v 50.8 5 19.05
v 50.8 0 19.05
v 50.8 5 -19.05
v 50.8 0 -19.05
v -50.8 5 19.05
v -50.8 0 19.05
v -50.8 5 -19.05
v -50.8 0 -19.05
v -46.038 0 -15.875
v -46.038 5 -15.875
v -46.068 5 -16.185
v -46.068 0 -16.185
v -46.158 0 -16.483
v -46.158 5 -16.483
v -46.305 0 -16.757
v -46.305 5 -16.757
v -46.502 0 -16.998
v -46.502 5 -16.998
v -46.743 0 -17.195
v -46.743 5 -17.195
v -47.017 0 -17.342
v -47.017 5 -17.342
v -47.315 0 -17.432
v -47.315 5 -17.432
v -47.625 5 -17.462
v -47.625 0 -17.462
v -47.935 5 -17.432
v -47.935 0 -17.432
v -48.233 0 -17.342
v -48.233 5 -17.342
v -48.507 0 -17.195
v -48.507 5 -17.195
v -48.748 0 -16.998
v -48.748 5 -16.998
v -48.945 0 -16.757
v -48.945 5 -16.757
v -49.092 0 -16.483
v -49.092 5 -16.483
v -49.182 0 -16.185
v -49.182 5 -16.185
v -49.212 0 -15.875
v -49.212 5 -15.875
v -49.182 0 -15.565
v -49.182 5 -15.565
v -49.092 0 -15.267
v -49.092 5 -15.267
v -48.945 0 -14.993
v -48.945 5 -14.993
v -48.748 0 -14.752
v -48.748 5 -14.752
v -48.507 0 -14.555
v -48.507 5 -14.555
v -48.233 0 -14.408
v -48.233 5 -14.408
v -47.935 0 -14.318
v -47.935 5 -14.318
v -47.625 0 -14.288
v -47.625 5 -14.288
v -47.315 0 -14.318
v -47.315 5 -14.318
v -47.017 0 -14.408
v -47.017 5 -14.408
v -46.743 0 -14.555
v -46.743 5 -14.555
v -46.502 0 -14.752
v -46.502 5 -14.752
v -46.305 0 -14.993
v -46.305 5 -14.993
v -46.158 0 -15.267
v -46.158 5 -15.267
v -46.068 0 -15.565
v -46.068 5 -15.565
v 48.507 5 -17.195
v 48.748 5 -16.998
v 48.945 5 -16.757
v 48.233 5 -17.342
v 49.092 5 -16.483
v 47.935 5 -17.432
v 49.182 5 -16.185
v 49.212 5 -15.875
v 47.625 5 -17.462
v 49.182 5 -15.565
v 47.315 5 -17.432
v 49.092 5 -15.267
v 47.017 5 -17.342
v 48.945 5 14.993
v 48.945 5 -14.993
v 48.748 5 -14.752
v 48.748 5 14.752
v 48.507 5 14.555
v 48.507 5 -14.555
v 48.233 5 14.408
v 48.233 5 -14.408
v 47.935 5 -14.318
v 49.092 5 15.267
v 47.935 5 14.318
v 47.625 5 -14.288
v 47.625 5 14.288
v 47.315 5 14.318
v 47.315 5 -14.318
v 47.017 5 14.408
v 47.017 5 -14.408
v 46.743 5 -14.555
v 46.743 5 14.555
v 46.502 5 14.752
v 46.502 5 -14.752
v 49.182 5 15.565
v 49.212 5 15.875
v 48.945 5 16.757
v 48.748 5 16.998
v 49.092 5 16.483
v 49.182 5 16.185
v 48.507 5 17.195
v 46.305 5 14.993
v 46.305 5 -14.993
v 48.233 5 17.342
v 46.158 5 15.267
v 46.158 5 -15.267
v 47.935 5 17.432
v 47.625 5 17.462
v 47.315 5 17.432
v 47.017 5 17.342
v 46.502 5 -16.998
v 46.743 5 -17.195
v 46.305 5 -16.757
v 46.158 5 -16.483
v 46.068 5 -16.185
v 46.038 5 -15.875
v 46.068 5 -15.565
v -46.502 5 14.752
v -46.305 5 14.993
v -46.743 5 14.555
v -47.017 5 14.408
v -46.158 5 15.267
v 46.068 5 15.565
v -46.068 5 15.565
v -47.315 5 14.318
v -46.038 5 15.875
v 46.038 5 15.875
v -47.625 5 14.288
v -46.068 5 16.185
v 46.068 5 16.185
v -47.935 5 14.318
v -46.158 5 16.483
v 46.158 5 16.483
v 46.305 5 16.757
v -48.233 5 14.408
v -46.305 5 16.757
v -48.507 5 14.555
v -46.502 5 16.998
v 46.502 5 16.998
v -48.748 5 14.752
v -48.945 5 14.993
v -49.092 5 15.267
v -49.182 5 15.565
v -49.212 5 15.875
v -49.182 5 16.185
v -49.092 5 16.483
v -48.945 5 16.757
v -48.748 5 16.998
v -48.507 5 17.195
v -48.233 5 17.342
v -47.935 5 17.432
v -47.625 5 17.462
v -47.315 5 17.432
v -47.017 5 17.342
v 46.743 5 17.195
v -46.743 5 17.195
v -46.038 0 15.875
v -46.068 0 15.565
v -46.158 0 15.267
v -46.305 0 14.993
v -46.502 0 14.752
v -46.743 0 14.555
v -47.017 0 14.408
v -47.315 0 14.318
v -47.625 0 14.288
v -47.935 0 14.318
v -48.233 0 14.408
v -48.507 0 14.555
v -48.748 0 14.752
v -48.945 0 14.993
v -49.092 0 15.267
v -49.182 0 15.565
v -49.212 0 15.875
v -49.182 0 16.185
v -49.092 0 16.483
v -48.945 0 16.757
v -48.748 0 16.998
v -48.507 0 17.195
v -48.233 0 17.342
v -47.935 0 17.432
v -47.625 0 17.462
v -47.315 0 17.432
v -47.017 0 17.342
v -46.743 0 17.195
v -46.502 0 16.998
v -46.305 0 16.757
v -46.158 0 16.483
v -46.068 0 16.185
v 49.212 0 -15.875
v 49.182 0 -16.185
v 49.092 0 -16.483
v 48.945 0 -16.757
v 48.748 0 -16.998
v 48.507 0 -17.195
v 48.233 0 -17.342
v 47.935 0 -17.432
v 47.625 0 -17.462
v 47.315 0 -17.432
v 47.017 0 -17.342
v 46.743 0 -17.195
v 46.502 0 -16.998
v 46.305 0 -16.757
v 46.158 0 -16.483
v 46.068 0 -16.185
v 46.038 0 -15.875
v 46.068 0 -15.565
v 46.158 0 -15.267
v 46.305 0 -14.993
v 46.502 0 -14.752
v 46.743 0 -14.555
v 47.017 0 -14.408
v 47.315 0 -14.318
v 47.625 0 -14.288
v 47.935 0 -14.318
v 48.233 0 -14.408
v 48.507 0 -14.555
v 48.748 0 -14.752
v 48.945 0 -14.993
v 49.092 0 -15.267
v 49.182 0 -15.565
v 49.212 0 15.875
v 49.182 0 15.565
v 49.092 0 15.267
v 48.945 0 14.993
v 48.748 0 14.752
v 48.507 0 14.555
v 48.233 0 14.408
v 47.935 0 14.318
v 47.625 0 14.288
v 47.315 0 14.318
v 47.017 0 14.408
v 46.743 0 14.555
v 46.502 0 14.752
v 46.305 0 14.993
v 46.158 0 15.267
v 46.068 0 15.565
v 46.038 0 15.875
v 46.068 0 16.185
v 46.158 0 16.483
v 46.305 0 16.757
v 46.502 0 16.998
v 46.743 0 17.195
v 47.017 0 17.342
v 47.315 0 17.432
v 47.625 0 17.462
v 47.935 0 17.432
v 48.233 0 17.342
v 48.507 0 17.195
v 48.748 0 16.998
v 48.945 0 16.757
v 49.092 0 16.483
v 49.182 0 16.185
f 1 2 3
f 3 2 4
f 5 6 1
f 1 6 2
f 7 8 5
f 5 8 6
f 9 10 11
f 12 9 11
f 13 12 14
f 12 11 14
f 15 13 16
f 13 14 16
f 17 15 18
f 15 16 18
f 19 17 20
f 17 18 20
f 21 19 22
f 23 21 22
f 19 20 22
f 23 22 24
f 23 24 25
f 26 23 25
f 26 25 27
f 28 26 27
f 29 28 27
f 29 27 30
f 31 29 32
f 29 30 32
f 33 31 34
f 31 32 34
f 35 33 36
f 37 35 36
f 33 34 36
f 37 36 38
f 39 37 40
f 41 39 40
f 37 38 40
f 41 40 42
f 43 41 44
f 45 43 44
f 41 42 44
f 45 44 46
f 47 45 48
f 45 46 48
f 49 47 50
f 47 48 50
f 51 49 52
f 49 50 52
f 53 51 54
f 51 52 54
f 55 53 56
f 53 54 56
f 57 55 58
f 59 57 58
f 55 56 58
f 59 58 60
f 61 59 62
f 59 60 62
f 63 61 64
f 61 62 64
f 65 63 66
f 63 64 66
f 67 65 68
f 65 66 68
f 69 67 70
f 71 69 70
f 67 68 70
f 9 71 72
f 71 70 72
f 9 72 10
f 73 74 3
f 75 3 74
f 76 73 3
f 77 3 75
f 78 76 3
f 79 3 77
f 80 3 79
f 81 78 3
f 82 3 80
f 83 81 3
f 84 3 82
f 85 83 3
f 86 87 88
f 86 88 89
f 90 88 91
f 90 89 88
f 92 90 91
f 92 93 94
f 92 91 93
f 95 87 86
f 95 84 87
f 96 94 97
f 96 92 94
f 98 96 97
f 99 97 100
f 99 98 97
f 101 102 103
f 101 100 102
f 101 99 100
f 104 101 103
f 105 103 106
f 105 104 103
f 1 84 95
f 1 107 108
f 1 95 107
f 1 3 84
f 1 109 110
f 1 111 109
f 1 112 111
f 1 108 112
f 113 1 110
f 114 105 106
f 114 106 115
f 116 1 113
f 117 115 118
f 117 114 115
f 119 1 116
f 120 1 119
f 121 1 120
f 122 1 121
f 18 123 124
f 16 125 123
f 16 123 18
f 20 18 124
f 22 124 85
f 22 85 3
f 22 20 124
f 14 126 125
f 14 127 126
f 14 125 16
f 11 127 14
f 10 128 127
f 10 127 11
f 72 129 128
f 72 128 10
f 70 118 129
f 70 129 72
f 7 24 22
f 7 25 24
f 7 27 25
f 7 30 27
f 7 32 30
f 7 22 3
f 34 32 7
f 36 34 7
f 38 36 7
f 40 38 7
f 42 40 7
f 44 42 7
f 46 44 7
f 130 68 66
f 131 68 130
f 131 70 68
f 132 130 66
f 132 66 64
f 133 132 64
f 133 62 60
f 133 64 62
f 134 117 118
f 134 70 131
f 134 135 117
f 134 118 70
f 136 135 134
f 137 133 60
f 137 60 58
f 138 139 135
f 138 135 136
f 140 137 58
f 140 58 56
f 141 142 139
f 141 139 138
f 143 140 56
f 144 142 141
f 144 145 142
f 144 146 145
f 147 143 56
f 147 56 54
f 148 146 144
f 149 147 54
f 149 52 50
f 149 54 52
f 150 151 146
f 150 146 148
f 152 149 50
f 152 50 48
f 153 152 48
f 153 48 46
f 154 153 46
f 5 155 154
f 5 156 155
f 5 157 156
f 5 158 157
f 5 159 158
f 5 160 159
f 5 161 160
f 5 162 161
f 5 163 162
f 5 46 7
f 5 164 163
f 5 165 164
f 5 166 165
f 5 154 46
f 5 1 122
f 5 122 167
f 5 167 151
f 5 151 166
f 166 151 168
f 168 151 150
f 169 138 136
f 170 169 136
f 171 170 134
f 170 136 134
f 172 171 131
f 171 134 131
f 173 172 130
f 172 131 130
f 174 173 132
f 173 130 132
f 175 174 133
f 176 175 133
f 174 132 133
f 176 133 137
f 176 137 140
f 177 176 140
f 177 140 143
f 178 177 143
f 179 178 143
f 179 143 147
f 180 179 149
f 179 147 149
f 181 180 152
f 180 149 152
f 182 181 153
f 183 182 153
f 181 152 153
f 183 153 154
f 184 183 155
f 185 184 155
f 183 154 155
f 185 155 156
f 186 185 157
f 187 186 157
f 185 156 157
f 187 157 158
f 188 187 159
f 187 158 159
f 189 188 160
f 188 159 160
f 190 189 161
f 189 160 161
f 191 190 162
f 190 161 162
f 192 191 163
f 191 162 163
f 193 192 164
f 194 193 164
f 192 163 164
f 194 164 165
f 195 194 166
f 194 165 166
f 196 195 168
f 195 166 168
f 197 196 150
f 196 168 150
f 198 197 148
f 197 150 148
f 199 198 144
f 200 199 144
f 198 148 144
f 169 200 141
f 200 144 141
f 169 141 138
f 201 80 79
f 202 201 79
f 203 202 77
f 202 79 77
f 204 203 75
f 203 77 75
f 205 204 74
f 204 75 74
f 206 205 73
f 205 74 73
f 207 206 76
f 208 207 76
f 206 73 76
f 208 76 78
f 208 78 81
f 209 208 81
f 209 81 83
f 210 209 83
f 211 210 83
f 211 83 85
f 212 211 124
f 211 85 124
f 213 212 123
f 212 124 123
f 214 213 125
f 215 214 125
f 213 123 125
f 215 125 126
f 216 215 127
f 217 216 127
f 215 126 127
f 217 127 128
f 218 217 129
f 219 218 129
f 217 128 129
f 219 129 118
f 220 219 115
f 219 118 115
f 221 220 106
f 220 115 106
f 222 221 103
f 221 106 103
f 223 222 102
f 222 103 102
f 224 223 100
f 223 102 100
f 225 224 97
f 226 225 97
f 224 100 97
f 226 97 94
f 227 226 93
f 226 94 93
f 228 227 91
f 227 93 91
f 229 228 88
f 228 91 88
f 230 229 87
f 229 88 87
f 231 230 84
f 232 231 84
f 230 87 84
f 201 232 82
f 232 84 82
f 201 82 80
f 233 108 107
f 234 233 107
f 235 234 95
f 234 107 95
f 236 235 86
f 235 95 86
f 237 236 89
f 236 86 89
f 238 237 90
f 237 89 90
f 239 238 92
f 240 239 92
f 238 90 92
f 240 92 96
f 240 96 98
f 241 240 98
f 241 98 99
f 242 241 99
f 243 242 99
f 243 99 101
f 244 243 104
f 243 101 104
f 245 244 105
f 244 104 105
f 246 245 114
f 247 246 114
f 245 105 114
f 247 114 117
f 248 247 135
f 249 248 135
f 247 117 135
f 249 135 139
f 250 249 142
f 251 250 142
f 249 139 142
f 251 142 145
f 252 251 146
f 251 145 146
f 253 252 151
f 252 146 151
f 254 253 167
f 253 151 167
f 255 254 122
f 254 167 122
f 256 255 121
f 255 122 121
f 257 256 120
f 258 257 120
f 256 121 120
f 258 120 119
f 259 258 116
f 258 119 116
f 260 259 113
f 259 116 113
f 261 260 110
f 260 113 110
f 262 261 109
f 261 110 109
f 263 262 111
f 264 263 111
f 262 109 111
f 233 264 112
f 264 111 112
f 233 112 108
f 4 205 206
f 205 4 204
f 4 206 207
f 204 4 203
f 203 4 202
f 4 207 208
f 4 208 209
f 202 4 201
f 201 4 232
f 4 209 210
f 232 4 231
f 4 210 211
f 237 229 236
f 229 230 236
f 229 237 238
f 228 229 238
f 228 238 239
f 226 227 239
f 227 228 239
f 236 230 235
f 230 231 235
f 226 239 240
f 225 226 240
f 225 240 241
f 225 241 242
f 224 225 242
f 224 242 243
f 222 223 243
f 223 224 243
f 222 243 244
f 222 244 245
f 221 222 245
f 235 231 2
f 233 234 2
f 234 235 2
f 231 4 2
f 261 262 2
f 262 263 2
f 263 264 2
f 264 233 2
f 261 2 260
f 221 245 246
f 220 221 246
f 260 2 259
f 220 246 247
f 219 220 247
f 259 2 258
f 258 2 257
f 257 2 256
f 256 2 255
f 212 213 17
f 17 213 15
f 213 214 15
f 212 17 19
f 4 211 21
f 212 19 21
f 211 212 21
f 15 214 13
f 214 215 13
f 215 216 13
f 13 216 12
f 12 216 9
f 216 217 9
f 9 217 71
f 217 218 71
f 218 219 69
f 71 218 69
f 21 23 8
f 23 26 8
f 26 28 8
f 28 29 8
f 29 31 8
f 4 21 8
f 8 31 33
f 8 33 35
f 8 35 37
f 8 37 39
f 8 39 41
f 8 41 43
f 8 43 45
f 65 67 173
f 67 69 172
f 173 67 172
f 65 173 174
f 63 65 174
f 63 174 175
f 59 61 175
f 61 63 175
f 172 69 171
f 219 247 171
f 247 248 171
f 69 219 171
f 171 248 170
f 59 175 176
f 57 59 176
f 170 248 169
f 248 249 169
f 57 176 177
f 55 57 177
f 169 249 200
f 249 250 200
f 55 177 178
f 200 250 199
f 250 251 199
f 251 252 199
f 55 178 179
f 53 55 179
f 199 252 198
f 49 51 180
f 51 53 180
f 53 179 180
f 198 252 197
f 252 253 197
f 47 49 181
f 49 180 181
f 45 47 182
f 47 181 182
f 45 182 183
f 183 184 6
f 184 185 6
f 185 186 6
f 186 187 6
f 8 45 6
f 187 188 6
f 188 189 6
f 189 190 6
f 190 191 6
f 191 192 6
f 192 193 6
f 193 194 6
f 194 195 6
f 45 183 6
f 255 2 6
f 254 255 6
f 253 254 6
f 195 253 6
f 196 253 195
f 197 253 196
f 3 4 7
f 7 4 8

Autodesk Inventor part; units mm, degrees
ref_plane "YZ Plane" through (0, 0, 0) normal (1, 0, 0) x (0, 1, 0)
ref_plane "XZ Plane" through (0, 0, 0) normal (0, 1, 0) x (-1, 0, 0)
ref_plane "XY Plane" through (0, 0, 0) normal (0, 0, 1) x (1, 0, 0)
sketch "Sketch1" plane through (0, 0, 0) normal (0, 1, 0) x (-1, 0, 0)
  line L0 (50.8, 19.05) -> (-50.8, 19.05)
  line L1 (-50.8, 19.05) -> (-50.8, -6.35)
  line L2 (50.8, -6.35) -> (50.8, 19.05)
  line L3 (-50.8, -6.35) -> (-50.8, -19.05)
  line L4 (-50.8, -19.05) -> (50.8, -19.05)
  line L5 (50.8, -19.05) -> (50.8, -6.35)
  line L6 (-50.8, -6.35) -> (-50.8, -6.35)
  line L7 (50.8, -6.35) -> (50.8, -6.35)
  point P0 (0, 0)
  dimension "d0" = 25.4
  dimension "d1" = 25.4
  dimension "d2" = 12.7
  dimension "d3" = 12.7
  dimension "d4" = 101.6
  dimension "d5" = 101.6
  dimension "d6" = 0
  dimension "d7" = 0
  dimension "d8" = 50.8
  dimension "d9" = 38.1
  dimension "d10" = 19.05
  dimension "d11" = 12.7
extrude "Extrusion1" add sketch "Sketch1" along normal blind 5
sketch "Sketch2" plane through (0, 5, 0) normal (0, 1, 0) x (1, 0, 0)
  circle A0 centre (-47.625, -15.875) radius 1.5875
  circle A1 centre (-47.625, 15.875) radius 1.5875
  circle A2 centre (47.625, 15.875) radius 1.5875
  circle A3 centre (47.625, -15.875) radius 1.5875
  line L0 (50.8, -19.05) -> (50.8, 19.05) projected
  line L1 (-50.8, 19.05) -> (-50.8, -19.05) projected
  line L2 (-50.8, -19.05) -> (50.8, -19.05) projected
  line L3 (50.8, 19.05) -> (-50.8, 19.05) projected
  point P0 (0, 0)
  point P1 (38.1, 6.35)
  dimension "d14" = 3.175
  dimension "d15" = 3.175
  dimension "d16" = 3.175
  dimension "d17" = 3.175
  dimension "d18" = 3.175
  dimension "d19" = 3.175
  dimension "d20" = 3.175
  dimension "d21" = 3.175
  dimension "d23" = 3.175
  dimension "d24" = 3.175
  dimension "d25" = 3.175
  dimension "d28" = 3.175
extrude "Extrusion2" cut sketch "Sketch2" against normal through all contours A0 | A1 | A2 | A3
equation "\"d1\" = d0"
equation "\"d8\" = 0.5 * d4"
equation "\"d10\" = 0.5 * d9"
equation "\"d16\" = d15"
equation "\"d17\" = d15"
equation "\"d18\" = d15"
equation "\"d19\" = d14"
equation "\"d21\" = d20"
equation "\"d23\" = d20"
equation "\"d24\" = d14"
equation "\"d25\" = d14"
equation "\"d28\" = d21"
properties part number "STARduino Mount" material "Polystyrene, High Impact"
